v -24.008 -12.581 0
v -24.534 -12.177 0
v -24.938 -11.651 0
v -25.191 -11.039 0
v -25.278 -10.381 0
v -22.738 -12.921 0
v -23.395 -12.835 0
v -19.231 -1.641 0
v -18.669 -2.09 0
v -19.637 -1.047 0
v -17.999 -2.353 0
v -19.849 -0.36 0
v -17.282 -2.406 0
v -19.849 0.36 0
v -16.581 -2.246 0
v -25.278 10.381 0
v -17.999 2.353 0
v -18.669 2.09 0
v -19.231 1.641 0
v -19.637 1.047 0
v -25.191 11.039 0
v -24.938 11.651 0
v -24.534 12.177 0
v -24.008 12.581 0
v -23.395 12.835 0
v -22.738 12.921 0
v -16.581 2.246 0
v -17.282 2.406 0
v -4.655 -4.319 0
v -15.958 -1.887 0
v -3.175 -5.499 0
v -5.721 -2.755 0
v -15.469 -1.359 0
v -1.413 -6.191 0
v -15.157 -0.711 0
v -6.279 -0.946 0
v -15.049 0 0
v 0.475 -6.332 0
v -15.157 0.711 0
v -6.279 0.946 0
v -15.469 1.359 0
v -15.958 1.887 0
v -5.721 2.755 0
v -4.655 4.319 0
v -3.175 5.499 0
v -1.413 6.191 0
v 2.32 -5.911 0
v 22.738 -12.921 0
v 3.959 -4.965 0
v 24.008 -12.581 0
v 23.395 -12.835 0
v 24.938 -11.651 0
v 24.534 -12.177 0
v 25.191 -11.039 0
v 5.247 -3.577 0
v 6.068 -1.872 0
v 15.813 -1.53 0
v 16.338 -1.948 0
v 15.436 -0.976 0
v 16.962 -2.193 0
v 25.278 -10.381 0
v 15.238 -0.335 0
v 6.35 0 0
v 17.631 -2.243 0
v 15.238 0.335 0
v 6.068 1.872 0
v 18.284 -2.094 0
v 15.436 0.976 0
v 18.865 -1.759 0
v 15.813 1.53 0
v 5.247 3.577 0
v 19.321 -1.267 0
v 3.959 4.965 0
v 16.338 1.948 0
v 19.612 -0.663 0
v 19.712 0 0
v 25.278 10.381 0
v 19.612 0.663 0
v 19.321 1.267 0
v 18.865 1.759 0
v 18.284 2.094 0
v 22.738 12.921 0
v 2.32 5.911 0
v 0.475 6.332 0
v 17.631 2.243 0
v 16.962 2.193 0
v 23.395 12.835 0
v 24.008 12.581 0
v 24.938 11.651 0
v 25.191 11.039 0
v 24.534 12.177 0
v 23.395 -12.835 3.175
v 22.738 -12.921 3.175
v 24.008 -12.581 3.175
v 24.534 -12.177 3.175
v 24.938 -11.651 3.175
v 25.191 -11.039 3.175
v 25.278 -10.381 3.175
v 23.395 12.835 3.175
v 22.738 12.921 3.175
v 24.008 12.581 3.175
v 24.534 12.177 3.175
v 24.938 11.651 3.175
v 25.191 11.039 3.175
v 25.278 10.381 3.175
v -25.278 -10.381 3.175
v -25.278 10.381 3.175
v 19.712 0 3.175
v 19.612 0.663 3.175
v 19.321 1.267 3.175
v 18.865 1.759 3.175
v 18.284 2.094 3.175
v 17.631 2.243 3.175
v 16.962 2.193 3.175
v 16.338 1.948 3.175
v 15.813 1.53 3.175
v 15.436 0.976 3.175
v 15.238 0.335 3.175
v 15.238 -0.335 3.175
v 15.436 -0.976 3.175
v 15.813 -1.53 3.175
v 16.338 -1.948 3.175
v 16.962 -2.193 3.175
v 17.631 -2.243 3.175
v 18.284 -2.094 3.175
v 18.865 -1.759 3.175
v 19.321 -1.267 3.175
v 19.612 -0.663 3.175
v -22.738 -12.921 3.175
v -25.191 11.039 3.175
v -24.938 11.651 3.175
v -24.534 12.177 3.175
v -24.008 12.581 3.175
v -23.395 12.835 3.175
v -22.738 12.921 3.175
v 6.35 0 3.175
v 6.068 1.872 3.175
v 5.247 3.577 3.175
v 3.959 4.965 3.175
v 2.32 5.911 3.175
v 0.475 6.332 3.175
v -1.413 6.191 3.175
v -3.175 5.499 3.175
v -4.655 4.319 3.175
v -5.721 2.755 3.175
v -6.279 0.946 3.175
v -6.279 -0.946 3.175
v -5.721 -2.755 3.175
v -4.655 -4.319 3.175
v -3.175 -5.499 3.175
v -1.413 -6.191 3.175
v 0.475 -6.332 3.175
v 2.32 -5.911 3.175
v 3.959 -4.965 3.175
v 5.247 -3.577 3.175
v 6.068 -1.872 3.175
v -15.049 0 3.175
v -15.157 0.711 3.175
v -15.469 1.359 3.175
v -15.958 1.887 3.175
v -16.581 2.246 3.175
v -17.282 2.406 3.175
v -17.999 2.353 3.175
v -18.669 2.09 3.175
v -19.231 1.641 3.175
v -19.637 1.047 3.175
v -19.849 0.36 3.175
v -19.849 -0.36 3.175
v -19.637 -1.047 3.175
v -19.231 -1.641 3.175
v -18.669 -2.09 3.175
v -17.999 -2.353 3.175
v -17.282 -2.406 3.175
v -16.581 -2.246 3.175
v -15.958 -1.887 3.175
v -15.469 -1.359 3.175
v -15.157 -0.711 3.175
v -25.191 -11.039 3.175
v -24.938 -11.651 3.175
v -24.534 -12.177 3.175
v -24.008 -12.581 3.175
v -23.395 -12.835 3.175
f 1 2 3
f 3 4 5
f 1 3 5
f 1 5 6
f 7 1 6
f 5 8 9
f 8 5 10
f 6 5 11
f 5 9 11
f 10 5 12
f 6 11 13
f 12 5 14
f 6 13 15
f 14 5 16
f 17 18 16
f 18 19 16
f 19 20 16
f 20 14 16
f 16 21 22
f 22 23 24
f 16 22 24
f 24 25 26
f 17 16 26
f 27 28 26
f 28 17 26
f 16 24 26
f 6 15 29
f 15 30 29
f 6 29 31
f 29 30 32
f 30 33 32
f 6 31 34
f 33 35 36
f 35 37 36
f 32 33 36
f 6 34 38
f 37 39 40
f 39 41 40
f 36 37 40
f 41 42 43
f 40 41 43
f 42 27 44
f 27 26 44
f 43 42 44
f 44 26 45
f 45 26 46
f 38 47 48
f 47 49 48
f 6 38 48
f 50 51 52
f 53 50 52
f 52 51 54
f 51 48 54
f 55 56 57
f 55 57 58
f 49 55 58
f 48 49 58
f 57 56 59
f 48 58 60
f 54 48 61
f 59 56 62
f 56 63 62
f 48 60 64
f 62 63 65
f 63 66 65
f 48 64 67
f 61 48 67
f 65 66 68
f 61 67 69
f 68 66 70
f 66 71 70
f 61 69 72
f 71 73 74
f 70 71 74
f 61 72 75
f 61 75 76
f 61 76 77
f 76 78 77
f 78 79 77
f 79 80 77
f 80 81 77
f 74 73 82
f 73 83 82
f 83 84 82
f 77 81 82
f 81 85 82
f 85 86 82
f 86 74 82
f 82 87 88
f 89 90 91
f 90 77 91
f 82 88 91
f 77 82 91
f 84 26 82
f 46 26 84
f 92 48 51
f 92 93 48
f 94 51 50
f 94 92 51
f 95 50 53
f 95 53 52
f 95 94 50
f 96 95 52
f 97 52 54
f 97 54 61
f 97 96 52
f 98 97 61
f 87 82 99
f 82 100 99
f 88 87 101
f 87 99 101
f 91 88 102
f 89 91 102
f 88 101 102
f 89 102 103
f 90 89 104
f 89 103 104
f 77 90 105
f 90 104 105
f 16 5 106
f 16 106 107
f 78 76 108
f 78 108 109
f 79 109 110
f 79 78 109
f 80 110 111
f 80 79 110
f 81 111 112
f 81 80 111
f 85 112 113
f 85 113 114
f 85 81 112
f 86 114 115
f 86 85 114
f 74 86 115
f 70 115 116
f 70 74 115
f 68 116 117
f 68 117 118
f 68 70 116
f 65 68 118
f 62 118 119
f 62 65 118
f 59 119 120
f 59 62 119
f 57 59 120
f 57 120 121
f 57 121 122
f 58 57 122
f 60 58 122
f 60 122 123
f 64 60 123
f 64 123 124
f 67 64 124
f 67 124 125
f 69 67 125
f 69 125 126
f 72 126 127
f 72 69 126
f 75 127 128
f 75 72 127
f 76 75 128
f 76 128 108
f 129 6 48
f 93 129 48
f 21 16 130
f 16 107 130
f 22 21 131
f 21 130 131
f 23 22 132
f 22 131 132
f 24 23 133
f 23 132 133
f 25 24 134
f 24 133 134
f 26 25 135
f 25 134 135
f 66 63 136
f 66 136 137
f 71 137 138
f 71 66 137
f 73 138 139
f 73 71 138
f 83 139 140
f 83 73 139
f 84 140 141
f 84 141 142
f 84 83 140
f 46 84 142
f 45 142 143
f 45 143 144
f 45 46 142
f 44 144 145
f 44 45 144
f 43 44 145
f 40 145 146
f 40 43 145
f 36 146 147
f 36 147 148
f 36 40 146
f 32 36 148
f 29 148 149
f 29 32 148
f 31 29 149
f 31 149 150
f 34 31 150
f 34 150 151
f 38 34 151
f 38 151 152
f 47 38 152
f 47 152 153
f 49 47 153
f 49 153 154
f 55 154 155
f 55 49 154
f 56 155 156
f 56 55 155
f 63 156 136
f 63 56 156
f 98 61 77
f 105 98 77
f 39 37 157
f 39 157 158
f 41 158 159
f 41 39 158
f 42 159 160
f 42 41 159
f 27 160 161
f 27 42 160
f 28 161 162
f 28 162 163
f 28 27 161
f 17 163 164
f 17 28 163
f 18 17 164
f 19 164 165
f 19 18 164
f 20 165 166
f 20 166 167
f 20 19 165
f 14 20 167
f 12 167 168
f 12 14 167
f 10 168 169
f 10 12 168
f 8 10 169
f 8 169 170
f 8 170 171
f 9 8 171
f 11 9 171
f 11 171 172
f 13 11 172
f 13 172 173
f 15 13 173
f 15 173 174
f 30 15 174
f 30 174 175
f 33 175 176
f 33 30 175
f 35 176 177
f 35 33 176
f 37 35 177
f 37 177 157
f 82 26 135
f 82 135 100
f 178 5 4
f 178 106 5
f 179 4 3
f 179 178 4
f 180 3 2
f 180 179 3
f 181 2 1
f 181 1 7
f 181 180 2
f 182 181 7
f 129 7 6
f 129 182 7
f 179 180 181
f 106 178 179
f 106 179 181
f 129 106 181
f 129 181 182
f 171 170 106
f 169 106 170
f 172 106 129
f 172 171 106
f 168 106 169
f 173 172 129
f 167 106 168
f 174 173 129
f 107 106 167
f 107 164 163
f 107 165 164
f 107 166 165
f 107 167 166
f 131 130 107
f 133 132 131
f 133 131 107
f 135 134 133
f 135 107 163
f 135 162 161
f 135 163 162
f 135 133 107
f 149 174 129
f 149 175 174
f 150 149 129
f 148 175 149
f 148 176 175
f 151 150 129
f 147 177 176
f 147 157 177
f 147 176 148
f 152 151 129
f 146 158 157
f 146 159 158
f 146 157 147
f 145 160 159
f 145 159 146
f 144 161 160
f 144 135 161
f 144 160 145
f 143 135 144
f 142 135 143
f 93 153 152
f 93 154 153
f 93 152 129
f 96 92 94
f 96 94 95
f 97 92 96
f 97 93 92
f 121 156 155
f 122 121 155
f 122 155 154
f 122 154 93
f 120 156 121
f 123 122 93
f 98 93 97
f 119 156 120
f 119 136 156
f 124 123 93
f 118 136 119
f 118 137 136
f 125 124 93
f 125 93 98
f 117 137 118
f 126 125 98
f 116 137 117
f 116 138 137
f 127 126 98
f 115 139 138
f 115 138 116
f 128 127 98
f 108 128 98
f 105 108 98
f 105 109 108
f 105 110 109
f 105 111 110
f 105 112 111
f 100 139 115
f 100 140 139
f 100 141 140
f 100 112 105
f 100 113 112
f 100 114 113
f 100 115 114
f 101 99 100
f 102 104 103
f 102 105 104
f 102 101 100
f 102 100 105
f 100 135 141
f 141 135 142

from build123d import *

# Parameters (mm, degrees)
SKETCH1_W           = 50.55571166
SKETCH1_H           = 25.842581666
SKETCH1_R           = 2.413
SKETCH1_R_2         = 2.249766629
SKETCH1_R_3         = 6.35
BOSS_EXTRUDE1_DEPTH = 3.175
FILLET1_R           = 2.54


with BuildPart() as part:
    # Sketch1 → Boss-Extrude1 (new body)
    with BuildSketch(Plane.XY):
        Rectangle(SKETCH1_W, SKETCH1_H)
        with Locations((-17.4625, 0)):
            Circle(SKETCH1_R, mode=Mode.SUBTRACT)
        with Locations((17.4625, 0)):
            Circle(SKETCH1_R_2, mode=Mode.SUBTRACT)
        Circle(SKETCH1_R_3, mode=Mode.SUBTRACT)
    extrude(amount=BOSS_EXTRUDE1_DEPTH)

    # Fillet1
    fillet1_edges = [part.edges().sort_by_distance(p)[0] for p in [
        (25.27785583, -12.921290833, 1.5875),
        (-25.27785583, -12.921290833, 1.5875),
        (-25.27785583, 12.921290833, 1.5875),
        (25.27785583, 12.921290833, 1.5875),
    ]]
    fillet(fillet1_edges, radius=FILLET1_R)


solid = part.part
